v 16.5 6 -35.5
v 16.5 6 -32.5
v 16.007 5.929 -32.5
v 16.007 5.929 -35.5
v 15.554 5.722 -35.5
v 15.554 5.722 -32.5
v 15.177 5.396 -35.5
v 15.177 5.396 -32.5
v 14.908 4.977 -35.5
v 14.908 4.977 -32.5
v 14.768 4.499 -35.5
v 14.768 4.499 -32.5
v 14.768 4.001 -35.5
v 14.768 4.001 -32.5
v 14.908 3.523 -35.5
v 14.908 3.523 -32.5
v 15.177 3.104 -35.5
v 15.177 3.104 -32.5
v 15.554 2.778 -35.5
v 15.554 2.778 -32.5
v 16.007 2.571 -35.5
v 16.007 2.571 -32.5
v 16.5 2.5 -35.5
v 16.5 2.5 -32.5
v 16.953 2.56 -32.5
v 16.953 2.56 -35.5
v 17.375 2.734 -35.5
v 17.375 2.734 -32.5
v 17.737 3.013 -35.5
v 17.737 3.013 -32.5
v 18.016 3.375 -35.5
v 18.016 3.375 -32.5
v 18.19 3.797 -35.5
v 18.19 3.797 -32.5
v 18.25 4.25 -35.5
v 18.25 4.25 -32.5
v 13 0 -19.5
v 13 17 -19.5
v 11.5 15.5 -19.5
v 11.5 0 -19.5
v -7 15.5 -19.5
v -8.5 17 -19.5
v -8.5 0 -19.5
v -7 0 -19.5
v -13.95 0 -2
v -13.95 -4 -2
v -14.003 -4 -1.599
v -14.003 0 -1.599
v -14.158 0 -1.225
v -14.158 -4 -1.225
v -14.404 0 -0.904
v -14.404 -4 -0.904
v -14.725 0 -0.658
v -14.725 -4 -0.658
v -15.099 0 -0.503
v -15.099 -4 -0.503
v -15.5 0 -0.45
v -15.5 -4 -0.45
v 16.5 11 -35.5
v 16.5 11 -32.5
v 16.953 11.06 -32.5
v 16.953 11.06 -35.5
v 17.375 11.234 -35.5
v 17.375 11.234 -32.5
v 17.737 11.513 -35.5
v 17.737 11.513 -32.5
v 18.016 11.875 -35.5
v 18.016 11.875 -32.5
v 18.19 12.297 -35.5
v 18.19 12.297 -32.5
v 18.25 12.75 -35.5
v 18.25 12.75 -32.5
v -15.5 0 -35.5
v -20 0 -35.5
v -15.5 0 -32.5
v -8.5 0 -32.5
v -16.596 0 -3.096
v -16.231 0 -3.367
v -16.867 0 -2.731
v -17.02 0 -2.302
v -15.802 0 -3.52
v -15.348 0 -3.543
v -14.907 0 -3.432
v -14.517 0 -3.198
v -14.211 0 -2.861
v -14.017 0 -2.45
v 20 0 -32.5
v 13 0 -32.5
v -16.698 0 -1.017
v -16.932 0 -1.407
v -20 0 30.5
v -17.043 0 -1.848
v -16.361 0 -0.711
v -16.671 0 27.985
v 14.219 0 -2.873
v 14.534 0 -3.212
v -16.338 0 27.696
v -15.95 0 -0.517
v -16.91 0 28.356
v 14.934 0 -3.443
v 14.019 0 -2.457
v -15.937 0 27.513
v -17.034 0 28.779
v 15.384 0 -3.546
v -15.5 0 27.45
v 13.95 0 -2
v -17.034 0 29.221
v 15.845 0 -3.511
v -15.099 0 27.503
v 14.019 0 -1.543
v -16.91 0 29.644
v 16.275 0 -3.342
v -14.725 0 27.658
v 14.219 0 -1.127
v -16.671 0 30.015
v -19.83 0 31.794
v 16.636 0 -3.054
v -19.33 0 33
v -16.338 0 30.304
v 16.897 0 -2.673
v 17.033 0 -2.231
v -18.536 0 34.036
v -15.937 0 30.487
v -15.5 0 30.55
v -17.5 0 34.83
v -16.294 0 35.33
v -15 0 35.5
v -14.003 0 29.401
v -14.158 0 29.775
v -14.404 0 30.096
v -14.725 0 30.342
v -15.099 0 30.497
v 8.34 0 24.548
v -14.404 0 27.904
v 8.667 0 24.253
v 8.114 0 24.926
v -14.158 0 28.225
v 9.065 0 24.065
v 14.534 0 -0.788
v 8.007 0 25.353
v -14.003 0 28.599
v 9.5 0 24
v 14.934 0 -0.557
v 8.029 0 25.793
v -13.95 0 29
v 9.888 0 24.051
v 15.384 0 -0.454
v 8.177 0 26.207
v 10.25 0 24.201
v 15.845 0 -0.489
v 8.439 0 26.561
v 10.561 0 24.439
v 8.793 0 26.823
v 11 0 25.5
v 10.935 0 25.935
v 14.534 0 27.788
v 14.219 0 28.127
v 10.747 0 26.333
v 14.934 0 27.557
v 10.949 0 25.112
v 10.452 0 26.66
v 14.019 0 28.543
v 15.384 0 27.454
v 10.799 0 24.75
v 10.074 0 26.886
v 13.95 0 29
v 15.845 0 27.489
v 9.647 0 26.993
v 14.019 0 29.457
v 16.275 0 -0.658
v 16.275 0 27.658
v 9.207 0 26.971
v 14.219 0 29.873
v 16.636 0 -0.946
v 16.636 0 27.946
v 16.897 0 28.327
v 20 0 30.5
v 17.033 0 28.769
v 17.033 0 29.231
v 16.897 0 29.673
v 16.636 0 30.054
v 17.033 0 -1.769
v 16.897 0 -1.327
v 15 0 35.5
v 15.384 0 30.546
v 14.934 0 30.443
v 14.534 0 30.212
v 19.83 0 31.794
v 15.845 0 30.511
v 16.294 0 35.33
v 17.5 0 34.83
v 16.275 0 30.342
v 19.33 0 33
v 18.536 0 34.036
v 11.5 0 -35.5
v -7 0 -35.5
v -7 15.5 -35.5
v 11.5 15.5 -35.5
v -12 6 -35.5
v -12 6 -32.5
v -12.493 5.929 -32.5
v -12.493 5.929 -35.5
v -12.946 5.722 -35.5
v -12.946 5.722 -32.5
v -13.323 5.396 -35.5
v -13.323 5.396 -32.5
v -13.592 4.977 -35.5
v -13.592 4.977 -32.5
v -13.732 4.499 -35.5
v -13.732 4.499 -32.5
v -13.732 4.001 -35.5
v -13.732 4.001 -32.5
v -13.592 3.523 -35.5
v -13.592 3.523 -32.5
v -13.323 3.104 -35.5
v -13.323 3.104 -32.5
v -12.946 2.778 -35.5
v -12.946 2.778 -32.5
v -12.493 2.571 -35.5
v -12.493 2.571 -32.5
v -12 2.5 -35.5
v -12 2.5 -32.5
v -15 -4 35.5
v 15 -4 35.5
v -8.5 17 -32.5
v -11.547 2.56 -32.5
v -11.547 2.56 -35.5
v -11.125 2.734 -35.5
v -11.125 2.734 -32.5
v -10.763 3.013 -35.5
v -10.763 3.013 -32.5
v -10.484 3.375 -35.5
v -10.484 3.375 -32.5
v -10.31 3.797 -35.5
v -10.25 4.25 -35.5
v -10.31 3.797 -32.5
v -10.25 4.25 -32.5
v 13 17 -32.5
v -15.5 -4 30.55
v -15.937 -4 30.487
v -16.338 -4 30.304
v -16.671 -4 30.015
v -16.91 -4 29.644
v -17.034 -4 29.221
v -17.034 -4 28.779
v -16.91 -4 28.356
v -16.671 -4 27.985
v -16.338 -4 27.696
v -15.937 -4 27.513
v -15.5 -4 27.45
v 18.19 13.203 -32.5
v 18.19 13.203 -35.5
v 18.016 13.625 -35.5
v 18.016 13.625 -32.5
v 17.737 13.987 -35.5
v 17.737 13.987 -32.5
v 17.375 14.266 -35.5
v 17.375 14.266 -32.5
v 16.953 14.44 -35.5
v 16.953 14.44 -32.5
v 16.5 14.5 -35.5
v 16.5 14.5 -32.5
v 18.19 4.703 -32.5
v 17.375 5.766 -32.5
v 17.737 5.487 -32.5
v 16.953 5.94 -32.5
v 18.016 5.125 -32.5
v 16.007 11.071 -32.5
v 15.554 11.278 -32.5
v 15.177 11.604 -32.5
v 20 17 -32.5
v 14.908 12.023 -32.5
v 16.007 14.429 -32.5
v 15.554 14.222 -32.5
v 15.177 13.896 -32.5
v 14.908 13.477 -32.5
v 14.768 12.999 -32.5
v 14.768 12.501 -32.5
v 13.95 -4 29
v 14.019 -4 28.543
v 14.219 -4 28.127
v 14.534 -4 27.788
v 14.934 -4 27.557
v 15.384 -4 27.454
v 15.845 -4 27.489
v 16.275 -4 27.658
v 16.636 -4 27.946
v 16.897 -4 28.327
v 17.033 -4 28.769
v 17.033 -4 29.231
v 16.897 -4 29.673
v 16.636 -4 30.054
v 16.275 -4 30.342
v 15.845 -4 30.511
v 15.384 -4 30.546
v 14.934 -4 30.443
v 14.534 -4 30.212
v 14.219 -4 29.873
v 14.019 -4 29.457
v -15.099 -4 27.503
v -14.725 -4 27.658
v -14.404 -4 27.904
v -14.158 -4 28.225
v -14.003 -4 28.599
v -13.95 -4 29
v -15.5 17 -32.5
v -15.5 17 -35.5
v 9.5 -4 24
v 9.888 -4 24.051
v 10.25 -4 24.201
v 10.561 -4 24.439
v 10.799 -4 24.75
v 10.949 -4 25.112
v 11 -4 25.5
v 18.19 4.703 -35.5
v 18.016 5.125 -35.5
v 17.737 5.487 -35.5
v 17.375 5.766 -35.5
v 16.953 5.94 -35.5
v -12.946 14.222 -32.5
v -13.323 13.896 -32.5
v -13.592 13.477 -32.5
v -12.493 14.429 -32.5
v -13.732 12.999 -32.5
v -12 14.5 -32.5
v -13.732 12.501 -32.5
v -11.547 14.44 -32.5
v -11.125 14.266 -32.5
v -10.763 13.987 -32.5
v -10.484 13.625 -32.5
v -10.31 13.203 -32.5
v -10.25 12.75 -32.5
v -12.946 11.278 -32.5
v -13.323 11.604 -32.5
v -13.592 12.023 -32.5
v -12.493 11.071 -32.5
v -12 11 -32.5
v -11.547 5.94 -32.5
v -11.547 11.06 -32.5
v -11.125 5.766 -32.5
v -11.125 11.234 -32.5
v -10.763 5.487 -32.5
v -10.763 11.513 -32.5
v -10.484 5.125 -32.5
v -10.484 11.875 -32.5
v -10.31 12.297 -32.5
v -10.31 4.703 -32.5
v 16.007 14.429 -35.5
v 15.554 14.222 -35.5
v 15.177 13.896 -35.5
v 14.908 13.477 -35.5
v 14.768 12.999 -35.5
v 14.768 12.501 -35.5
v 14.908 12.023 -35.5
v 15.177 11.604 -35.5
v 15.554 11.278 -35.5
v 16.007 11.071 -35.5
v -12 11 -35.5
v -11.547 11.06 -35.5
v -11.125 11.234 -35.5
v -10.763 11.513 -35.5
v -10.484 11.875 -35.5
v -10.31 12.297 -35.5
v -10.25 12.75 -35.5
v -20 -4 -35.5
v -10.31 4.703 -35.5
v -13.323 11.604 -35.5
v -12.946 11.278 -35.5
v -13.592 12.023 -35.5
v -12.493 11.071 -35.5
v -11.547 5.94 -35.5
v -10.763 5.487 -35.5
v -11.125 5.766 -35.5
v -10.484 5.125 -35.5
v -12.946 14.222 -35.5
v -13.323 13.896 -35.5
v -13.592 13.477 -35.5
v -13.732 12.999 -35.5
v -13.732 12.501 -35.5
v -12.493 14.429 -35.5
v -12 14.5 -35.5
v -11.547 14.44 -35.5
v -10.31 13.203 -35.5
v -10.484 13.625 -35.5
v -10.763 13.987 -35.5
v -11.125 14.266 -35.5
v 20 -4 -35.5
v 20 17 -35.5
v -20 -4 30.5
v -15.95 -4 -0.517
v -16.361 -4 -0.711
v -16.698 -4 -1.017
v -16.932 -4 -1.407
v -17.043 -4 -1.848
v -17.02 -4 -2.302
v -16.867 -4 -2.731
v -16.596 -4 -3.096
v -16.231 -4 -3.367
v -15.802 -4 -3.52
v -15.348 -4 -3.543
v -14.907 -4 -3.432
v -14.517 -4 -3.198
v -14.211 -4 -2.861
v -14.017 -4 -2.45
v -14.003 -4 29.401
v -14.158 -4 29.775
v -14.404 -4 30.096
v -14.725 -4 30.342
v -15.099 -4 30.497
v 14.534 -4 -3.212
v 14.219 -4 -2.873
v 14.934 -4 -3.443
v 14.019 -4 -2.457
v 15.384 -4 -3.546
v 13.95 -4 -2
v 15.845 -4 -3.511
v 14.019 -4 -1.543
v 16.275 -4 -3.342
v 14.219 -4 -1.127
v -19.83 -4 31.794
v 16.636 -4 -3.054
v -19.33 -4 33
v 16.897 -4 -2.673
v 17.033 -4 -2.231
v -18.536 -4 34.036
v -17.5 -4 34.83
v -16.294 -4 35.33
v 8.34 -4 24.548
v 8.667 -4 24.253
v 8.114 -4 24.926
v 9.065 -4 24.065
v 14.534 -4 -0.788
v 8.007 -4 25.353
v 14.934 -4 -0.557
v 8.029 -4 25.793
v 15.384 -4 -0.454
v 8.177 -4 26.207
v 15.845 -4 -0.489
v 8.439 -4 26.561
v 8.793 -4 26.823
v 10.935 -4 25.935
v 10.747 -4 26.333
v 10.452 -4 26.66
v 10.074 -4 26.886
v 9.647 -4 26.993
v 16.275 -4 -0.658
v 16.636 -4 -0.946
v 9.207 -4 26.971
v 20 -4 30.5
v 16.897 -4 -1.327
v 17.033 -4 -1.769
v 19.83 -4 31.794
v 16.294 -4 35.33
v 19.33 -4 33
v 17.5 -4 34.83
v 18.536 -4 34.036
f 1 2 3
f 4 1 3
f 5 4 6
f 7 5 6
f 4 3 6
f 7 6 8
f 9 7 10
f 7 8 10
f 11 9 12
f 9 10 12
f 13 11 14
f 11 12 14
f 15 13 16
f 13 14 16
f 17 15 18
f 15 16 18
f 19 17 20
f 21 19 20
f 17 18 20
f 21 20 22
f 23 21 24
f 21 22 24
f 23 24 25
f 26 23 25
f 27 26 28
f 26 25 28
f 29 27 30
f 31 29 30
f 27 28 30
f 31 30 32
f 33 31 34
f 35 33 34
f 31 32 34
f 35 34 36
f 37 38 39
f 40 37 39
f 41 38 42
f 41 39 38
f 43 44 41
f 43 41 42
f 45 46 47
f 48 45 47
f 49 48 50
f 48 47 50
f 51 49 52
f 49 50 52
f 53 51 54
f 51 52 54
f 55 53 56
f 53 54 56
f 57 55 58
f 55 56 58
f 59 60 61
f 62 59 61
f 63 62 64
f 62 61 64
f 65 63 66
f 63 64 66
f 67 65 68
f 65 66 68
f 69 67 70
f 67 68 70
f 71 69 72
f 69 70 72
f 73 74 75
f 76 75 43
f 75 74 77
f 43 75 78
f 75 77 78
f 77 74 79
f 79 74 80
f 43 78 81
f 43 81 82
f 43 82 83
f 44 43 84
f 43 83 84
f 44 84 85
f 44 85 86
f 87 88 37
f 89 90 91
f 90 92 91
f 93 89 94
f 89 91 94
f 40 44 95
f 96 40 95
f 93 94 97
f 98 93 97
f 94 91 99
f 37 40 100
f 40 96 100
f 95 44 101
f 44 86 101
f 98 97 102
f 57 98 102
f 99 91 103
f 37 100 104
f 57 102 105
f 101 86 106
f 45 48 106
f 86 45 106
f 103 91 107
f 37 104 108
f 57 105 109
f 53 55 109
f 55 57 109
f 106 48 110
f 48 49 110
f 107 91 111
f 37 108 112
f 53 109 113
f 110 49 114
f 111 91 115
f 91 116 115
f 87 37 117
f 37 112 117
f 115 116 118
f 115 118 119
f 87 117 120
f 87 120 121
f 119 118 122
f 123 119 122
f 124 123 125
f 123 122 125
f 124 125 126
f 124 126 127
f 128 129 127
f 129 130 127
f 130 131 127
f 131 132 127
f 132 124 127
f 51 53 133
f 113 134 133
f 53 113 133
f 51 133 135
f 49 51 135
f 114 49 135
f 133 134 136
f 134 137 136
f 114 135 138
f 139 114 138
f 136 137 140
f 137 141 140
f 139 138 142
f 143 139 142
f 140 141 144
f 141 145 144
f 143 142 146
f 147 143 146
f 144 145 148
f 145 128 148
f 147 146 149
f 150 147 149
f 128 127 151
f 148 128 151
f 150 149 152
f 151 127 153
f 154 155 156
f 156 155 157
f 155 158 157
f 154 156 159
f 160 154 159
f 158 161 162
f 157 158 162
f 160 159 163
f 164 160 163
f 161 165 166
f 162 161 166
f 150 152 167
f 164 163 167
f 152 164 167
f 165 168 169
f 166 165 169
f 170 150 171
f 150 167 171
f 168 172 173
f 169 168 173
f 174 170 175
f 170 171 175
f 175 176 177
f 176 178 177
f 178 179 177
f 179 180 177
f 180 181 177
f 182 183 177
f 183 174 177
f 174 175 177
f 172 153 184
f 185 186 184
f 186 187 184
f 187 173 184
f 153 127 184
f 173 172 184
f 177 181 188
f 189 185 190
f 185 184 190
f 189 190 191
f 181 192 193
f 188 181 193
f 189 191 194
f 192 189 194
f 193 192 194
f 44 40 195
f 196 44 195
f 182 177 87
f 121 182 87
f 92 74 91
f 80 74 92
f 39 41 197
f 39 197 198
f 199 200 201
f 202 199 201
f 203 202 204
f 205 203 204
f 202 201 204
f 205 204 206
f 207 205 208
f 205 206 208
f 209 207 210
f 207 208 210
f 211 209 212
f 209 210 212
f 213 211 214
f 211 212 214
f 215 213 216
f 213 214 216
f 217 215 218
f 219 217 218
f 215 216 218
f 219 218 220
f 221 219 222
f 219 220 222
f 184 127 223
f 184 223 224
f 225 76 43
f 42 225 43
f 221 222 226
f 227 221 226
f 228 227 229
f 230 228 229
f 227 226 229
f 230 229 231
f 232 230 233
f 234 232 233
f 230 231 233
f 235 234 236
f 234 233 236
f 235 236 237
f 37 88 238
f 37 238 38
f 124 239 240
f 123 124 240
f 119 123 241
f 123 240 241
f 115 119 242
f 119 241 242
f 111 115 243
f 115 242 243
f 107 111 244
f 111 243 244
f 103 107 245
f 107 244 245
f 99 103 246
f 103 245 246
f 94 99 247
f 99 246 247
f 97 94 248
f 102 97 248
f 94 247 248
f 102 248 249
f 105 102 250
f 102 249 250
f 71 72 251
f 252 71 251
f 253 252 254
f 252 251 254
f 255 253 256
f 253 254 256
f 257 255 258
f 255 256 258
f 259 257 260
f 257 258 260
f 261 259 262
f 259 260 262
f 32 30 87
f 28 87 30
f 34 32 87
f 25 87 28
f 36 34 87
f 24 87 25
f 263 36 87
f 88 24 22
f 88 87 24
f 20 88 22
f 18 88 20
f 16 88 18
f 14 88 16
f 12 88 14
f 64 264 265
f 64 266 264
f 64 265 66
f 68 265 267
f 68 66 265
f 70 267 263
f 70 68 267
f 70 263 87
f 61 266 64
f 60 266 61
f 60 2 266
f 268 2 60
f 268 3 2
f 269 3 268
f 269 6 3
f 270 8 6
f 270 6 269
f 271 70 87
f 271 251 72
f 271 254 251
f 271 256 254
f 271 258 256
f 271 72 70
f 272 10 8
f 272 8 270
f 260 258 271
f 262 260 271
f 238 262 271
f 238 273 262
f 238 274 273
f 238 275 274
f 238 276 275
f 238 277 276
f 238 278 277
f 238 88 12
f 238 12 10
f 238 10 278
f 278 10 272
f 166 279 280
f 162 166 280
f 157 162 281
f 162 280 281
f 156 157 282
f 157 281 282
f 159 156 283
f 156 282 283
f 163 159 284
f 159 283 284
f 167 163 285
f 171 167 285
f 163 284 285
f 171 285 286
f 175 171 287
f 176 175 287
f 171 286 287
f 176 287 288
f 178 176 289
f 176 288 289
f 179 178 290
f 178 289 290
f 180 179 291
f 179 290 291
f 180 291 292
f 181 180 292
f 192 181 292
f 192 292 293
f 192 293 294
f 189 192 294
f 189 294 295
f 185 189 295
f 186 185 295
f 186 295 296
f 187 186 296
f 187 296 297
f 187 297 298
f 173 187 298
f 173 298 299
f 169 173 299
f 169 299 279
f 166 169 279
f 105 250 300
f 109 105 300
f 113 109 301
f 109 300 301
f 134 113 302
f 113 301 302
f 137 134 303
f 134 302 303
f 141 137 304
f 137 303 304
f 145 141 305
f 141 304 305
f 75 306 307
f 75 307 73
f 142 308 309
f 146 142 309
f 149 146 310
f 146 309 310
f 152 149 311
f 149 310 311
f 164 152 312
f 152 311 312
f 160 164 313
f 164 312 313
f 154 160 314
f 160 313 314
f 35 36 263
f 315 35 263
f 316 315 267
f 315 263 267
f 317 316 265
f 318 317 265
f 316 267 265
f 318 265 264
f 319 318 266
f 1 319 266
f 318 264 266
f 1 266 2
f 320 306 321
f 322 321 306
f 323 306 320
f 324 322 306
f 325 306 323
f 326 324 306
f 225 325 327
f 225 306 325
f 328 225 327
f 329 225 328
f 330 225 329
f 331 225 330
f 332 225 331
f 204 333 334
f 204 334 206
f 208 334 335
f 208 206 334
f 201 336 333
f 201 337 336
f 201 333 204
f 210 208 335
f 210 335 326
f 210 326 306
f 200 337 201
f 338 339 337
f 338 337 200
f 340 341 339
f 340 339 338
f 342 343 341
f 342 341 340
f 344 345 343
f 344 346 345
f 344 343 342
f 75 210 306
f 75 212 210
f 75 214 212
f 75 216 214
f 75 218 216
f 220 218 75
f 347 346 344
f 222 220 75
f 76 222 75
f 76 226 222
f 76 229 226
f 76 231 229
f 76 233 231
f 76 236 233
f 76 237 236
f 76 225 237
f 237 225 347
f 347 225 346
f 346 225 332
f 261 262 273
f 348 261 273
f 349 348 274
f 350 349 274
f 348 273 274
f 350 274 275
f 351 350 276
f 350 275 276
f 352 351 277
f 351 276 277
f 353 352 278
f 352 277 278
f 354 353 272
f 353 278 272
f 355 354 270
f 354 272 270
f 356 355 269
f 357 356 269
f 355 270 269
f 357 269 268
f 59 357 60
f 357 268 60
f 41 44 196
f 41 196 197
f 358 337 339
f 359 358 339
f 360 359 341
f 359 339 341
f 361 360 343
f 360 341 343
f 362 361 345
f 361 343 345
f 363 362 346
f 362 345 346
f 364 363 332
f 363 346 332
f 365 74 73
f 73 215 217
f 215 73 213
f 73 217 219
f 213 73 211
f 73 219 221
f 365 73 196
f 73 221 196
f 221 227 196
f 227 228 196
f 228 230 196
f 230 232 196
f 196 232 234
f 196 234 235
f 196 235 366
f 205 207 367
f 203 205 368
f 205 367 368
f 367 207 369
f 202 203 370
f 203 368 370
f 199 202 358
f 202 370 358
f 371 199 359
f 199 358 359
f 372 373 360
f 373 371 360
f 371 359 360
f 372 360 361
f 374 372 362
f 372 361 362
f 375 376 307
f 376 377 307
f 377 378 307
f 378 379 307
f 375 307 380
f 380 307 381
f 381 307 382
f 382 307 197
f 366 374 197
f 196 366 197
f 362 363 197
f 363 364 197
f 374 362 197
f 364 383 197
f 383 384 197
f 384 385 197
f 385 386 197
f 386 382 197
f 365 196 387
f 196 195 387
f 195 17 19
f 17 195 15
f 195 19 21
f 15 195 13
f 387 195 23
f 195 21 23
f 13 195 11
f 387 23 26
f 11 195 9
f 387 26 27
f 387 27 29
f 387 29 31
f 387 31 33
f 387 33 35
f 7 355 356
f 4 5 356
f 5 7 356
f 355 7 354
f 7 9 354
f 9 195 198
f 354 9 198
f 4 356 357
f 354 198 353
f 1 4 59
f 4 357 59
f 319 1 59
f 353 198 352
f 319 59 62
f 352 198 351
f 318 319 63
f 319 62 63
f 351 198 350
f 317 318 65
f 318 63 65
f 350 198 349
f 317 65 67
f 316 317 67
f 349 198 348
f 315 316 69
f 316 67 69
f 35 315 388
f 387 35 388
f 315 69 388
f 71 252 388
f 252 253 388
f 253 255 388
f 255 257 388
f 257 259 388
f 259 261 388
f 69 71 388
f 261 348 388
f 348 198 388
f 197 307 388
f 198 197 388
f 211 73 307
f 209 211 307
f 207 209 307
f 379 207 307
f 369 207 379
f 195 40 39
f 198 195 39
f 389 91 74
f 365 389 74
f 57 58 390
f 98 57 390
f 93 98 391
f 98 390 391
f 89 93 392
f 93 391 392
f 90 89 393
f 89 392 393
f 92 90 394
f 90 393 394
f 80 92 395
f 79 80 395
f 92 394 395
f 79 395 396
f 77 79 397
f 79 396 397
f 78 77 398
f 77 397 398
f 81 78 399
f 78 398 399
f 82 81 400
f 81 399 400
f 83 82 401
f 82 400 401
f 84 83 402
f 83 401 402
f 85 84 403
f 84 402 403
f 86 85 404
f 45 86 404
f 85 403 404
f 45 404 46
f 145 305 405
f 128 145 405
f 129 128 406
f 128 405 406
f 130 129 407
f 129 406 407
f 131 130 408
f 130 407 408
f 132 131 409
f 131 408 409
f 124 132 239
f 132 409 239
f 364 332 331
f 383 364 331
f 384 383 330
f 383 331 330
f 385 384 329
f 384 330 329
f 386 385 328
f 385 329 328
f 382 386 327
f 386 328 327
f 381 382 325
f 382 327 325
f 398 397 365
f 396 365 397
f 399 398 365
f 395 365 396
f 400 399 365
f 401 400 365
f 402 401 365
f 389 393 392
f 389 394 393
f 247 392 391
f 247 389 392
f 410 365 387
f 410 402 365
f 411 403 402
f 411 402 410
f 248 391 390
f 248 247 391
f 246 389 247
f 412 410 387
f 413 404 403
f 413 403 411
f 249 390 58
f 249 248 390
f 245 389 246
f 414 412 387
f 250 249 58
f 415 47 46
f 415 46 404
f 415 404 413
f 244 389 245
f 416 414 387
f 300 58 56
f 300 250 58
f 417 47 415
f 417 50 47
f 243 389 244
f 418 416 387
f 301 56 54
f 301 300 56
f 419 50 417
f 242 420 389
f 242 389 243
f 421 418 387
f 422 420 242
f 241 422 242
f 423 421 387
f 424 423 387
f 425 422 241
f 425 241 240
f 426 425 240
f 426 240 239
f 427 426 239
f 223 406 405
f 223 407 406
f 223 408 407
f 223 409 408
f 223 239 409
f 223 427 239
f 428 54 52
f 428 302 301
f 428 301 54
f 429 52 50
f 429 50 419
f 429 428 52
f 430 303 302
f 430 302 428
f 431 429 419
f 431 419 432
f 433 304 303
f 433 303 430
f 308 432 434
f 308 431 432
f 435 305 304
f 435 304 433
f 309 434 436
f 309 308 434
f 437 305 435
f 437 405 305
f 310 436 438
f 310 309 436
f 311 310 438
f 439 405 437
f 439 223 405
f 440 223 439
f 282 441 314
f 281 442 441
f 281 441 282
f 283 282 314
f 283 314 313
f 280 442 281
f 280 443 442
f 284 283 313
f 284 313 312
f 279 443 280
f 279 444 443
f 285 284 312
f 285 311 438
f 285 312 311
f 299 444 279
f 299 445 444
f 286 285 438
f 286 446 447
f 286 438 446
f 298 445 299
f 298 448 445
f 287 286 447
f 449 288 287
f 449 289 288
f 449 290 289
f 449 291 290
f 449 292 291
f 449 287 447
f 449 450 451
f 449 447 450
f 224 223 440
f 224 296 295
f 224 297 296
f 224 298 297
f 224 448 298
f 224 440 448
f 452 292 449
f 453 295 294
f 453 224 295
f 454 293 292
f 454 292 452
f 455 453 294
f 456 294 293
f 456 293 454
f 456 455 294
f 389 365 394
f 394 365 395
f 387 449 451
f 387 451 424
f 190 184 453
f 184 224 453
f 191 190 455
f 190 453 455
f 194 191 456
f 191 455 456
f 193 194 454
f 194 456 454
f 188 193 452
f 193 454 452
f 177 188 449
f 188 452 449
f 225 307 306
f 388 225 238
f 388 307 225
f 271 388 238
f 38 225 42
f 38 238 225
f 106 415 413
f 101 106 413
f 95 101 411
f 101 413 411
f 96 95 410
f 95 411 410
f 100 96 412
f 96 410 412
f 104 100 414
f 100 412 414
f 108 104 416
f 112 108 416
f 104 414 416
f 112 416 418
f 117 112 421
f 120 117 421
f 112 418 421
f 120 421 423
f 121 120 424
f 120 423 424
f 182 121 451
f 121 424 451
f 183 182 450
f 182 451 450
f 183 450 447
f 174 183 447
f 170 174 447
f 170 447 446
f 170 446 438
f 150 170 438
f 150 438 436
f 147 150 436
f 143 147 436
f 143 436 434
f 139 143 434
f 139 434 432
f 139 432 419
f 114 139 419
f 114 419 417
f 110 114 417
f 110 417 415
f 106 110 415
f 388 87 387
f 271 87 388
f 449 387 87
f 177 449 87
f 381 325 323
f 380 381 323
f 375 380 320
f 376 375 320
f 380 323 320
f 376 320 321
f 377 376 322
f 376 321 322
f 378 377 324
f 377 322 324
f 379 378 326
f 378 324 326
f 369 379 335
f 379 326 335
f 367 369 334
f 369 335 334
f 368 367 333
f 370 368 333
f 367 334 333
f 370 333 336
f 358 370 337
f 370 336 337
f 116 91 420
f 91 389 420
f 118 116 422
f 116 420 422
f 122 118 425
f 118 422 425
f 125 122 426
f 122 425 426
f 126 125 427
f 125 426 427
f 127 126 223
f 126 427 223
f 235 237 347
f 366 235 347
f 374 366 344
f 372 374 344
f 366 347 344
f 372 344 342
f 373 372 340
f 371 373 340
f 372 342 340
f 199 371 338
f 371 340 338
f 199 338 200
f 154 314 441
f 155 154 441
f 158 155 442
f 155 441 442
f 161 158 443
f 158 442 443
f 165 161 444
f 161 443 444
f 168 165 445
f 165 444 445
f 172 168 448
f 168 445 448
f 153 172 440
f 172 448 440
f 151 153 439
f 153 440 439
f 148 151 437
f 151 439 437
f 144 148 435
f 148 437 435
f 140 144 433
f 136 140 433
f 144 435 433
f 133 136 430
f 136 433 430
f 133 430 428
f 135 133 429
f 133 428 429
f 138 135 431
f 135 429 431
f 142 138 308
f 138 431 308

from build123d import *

# Parameters (mm, degrees)
F0_W      = 40
F0_H      = 71
F1_DEPTH  = 4
F3_DEPTH  = 25
F4_W      = 21.5
F4_H      = 16
F5_DEPTH  = 17
F6_W      = 18.5
F6_H      = 15.5
F7_DEPTH  = 25
F8_W      = 17
F8_H      = 3
F9_DEPTH  = 7
F10_W     = 17
F10_H     = 3
F11_DEPTH = 7
F13_DEPTH = 25
F15_DEPTH = 25
F17_DEPTH = 10
F18_DEPTH = 25
F20_R     = 5
F21_DEPTH = 10
F22_R     = 2.0074769643
F23_DEPTH = 4
F25_DEPTH = 25


with BuildPart() as f1:
    # F0 (on Front) → F1 (new body)
    with BuildSketch(Plane.XZ):
        Rectangle(F0_W, F0_H)
    extrude(amount=F1_DEPTH)

    # F2 (on face) → F3 (cut)
    with BuildSketch(Plane.XZ.offset(4)):
        with BuildLine():
            ThreePointArc((17.05, -2), (15.5, -0.45), (13.95, -2))
            ThreePointArc((13.95, -2), (15.5, -3.55), (17.05, -2))
        make_face()
        with BuildLine():
            ThreePointArc((-13.95, -2), (-14.4039844892, -0.9039844892), (-15.5, -0.45))
            Line((-15.5, -0.45), (-15.5, -2))
            Line((-15.5, -2), (-13.95, -2))
        make_face()
        with BuildLine():
            Line((-15.5, -2), (-15.5, -0.45))
            ThreePointArc((-15.5, -0.45), (-16.5960155108, -3.0960155108), (-13.95, -2))
            Line((-13.95, -2), (-15.5, -2))
        make_face()
        with BuildLine():
            ThreePointArc((-15.5, 27.45), (-14.4039844892, 27.9039844892), (-13.95, 29))
            Line((-13.95, 29), (-15.5, 29))
            Line((-15.5, 29), (-15.5, 27.45))
        make_face()
        with BuildLine():
            Line((-15.5, 29), (-13.95, 29))
            ThreePointArc((-13.95, 29), (-14.4039844892, 30.0960155108), (-15.5, 30.55))
            Line((-15.5, 30.55), (-15.5, 29))
        make_face()
        with BuildLine():
            ThreePointArc((17.05, 29), (15.5, 30.55), (13.95, 29))
            ThreePointArc((13.95, 29), (15.5, 27.45), (17.05, 29))
        make_face()
        with BuildLine():
            Line((-15.5, 27.45), (-15.5, 29))
            Line((-15.5, 29), (-15.5, 30.55))
            ThreePointArc((-15.5, 30.55), (-17.05, 29), (-15.5, 27.45))
        make_face()
    extrude(amount=-F3_DEPTH, mode=Mode.SUBTRACT)

    # F4 (on face) → F5 (join)
    with BuildSketch(Plane(origin=(0, 0, 0), x_dir=(-1, 0, 0), z_dir=(0, 1, 0))):
        with Locations((-2.25, -27.5)):
            Rectangle(F4_W, F4_H)
    extrude(amount=F5_DEPTH)

    # F6 (on face) → F7 (cut)
    with BuildSketch(Plane.XY.offset(-19.5)):
        with Locations((2.25, 7.75)):
            Rectangle(F6_W, F6_H)
    extrude(amount=-F7_DEPTH, mode=Mode.SUBTRACT)

    # F8 (on face) → F9 (join)
    with BuildSketch(Plane.YZ.offset(13)):
        with Locations((8.5, -34)):
            Rectangle(F8_W, F8_H)
    extrude(amount=F9_DEPTH)

    # F10 (on face) → F11 (join)
    with BuildSketch(Plane(origin=(-8.5, 0, 0), x_dir=(0, -1, 0), z_dir=(-1, 0, 0))):
        with Locations((-8.5, -34)):
            Rectangle(F10_W, F10_H)
    extrude(amount=F11_DEPTH)

    # F12 (on face) → F13 (cut)
    with BuildSketch(Plane.XY.offset(-32.5)):
        with BuildLine():
            Line((-12, 14.5), (-12, 11))
            ThreePointArc((-12, 11), (-10.7625631329, 11.5125631329), (-10.25, 12.75))
            ThreePointArc((-10.25, 12.75), (-10.7625631329, 13.9874368671), (-12, 14.5))
        make_face()
        with BuildLine():
            ThreePointArc((-12, 14.5), (-13.75, 12.75), (-12, 11))
            Line((-12, 11), (-12, 14.5))
        make_face()
        with BuildLine():
            ThreePointArc((-12, 6), (-13.75, 4.25), (-12, 2.5))
            Line((-12, 2.5), (-12, 6))
        make_face()
        with BuildLine():
            Line((-12, 6), (-12, 2.5))
            ThreePointArc((-12, 2.5), (-10.7625631329, 3.0125631329), (-10.25, 4.25))
            ThreePointArc((-10.25, 4.25), (-10.7625631329, 5.4874368671), (-12, 6))
        make_face()
    extrude(amount=-F13_DEPTH, mode=Mode.SUBTRACT)

    # F14 (on face) → F15 (cut)
    with BuildSketch(Plane.XY.offset(-32.5)):
        with BuildLine():
            ThreePointArc((18.25, 12.75), (17.7374368671, 13.9874368671), (16.5, 14.5))
            Line((16.5, 14.5), (16.5, 11))
            ThreePointArc((16.5, 11), (17.7374368671, 11.5125631329), (18.25, 12.75))
        make_face()
        with BuildLine():
            ThreePointArc((18.25, 4.25), (17.7374368671, 5.4874368671), (16.5, 6))
            Line((16.5, 6), (16.5, 2.5))
            ThreePointArc((16.5, 2.5), (17.7374368671, 3.0125631329), (18.25, 4.25))
        make_face()
        with BuildLine():
            Line((16.5, 2.5), (16.5, 6))
            ThreePointArc((16.5, 6), (14.75, 4.25), (16.5, 2.5))
        make_face()
        with BuildLine():
            Line((16.5, 11), (16.5, 14.5))
            ThreePointArc((16.5, 14.5), (14.75, 12.75), (16.5, 11))
        make_face()
    extrude(amount=-F15_DEPTH, mode=Mode.SUBTRACT)

    # F16 (on face) → F17 (join)
    with BuildSketch(Plane.XZ.offset(4)):
        Polygon((-20, -25.5), (-20, -35.5), (-15.5, -35.5), (-11, -35.5), (-11, -25.5), align=None)
        with BuildLine():
            ThreePointArc((-13.75, -30.5), (-14.2625631329, -31.7374368671), (-15.5, -32.25))
            ThreePointArc((-15.5, -32.25), (-16.7374368671, -29.2625631329), (-13.75, -30.5))
        make_face(mode=Mode.SUBTRACT)
    extrude(amount=F17_DEPTH)

    # F18 (cut): a face of the model
    f18_faces = [f1.faces().sort_by_distance(p)[0] for p in [
        (-15.5, -4, -30.5),
    ]]
    extrude(f18_faces, amount=-F18_DEPTH, mode=Mode.SUBTRACT)

    # F20
    f20_edges = [f1.edges().sort_by_distance(p)[0] for p in [
        (-20, -2, 35.5),
        (20, -2, 35.5),
    ]]
    fillet(f20_edges, radius=F20_R)

    # F21 (cut): a face of the model
    f21_faces = [f1.faces().sort_by_distance(p)[0] for p in [
        (-19.8654637595, -14, -30.5),
    ]]
    extrude(f21_faces, amount=-F21_DEPTH, mode=Mode.SUBTRACT)

    # F22 (on face) → F23 (join)
    with BuildSketch(Plane.XZ.offset(4)):
        with Locations((-15.5, -30.5)):
            Circle(F22_R)
    extrude(amount=-F23_DEPTH)

    # F24 (on face) → F25 (cut)
    with BuildSketch(Plane.XZ.offset(4)):
        with BuildLine():
            ThreePointArc((9.5, 24), (10.5606601718, 24.4393398282), (11, 25.5))
            ThreePointArc((11, 25.5), (8.4393398282, 26.5606601718), (9.5, 24))
        make_face()
    extrude(amount=-F25_DEPTH, mode=Mode.SUBTRACT)


solid = f1.part
